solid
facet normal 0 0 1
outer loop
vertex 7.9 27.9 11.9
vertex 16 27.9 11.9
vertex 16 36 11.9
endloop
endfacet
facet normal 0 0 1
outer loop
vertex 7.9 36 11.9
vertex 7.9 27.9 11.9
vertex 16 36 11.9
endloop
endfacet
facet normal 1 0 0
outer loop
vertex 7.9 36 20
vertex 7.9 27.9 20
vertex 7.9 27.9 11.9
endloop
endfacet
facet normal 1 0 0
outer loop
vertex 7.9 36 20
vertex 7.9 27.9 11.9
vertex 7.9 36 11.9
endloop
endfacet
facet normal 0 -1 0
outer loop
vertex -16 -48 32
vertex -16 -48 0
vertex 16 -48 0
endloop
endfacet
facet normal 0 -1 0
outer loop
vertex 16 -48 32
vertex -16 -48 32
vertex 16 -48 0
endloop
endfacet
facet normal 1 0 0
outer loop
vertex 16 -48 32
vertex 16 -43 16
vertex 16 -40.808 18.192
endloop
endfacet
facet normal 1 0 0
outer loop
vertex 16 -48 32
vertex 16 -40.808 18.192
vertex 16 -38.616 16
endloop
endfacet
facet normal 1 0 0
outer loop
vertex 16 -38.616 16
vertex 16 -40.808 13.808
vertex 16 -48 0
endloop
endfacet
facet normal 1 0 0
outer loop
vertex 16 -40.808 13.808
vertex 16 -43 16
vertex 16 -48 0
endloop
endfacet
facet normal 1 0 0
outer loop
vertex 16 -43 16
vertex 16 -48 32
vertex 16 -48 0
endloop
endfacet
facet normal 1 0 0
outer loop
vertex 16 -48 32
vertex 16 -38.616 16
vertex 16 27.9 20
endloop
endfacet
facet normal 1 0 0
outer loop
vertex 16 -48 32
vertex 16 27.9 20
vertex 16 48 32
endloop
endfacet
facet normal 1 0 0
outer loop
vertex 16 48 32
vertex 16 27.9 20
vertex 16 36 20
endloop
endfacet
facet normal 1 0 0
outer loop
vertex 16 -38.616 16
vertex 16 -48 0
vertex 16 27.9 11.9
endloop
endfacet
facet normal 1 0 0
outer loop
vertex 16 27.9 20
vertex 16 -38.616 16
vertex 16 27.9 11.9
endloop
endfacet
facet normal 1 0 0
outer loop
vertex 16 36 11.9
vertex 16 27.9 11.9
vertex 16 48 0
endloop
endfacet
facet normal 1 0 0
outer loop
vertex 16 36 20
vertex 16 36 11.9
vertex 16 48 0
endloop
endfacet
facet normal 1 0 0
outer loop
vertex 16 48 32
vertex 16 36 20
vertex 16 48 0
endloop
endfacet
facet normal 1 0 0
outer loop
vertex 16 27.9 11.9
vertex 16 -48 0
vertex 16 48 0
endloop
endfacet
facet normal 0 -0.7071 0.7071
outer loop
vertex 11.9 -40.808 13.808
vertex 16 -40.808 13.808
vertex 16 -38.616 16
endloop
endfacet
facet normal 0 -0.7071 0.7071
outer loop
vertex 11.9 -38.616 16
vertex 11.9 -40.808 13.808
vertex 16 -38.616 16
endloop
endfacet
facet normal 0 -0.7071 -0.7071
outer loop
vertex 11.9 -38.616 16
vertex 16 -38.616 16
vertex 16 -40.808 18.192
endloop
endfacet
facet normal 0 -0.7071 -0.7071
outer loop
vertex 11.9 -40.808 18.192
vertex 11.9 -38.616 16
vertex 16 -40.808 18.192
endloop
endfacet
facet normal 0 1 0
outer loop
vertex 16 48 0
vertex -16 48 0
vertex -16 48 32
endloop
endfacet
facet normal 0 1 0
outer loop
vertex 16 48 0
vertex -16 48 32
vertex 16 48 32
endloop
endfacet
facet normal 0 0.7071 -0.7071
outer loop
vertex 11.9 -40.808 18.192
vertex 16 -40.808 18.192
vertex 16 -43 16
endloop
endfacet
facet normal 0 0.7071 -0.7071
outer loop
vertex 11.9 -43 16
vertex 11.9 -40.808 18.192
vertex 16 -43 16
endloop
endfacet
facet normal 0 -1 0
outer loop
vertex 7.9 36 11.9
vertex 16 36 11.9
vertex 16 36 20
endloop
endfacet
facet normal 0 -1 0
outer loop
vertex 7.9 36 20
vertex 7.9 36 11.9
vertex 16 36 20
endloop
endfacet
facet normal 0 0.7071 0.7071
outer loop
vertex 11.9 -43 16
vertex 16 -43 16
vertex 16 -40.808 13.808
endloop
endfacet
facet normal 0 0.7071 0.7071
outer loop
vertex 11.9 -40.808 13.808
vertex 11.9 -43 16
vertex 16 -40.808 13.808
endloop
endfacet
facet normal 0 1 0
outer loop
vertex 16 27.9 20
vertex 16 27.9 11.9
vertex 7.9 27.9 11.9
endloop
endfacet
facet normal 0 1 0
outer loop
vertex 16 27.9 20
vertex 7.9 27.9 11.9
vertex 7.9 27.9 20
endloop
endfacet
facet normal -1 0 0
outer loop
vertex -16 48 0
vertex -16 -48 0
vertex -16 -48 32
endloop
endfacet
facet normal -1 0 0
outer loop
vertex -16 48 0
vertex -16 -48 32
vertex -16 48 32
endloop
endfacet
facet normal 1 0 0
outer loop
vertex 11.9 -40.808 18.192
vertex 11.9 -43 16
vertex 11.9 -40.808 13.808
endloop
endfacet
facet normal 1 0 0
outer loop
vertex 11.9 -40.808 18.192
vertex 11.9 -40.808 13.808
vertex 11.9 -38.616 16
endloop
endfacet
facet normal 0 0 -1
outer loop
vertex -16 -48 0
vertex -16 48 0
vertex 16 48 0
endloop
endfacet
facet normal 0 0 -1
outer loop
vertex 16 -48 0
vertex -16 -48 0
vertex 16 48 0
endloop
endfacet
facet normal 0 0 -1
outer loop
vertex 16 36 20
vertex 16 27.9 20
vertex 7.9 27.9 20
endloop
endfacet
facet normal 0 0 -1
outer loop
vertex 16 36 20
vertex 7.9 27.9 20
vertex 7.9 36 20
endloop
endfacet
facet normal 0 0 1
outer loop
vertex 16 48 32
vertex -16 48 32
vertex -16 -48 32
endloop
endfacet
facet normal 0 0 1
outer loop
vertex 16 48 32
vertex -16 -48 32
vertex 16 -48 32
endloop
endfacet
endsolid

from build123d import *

# Parameters (mm, degrees)
F0_W     = 32
F0_H     = 96
F1_DEPTH = 32
F2_W     = 8.1
F2_H     = 8.1
F3_DEPTH = 8.1
F5_DEPTH = 4.1


with BuildPart() as f1:
    # F0 (on Top) → F1 (new body)
    with BuildSketch(Plane.XY):
        Rectangle(F0_W, F0_H)
    extrude(amount=F1_DEPTH)

    # F2 (on face) → F3 (cut)
    with BuildSketch(Plane.YZ.offset(16)):
        with Locations((31.95, 15.95)):
            Rectangle(F2_W, F2_H)
    extrude(amount=-F3_DEPTH, mode=Mode.SUBTRACT)

    # F4 (on face) → F5 (cut)
    with BuildSketch(Plane.YZ.offset(16)):
        Polygon((-38.615938, 16), (-40.807969, 18.192031), (-43, 16), (-40.807969, 13.807969), align=None)
    extrude(amount=-F5_DEPTH, mode=Mode.SUBTRACT)


solid = f1.part
